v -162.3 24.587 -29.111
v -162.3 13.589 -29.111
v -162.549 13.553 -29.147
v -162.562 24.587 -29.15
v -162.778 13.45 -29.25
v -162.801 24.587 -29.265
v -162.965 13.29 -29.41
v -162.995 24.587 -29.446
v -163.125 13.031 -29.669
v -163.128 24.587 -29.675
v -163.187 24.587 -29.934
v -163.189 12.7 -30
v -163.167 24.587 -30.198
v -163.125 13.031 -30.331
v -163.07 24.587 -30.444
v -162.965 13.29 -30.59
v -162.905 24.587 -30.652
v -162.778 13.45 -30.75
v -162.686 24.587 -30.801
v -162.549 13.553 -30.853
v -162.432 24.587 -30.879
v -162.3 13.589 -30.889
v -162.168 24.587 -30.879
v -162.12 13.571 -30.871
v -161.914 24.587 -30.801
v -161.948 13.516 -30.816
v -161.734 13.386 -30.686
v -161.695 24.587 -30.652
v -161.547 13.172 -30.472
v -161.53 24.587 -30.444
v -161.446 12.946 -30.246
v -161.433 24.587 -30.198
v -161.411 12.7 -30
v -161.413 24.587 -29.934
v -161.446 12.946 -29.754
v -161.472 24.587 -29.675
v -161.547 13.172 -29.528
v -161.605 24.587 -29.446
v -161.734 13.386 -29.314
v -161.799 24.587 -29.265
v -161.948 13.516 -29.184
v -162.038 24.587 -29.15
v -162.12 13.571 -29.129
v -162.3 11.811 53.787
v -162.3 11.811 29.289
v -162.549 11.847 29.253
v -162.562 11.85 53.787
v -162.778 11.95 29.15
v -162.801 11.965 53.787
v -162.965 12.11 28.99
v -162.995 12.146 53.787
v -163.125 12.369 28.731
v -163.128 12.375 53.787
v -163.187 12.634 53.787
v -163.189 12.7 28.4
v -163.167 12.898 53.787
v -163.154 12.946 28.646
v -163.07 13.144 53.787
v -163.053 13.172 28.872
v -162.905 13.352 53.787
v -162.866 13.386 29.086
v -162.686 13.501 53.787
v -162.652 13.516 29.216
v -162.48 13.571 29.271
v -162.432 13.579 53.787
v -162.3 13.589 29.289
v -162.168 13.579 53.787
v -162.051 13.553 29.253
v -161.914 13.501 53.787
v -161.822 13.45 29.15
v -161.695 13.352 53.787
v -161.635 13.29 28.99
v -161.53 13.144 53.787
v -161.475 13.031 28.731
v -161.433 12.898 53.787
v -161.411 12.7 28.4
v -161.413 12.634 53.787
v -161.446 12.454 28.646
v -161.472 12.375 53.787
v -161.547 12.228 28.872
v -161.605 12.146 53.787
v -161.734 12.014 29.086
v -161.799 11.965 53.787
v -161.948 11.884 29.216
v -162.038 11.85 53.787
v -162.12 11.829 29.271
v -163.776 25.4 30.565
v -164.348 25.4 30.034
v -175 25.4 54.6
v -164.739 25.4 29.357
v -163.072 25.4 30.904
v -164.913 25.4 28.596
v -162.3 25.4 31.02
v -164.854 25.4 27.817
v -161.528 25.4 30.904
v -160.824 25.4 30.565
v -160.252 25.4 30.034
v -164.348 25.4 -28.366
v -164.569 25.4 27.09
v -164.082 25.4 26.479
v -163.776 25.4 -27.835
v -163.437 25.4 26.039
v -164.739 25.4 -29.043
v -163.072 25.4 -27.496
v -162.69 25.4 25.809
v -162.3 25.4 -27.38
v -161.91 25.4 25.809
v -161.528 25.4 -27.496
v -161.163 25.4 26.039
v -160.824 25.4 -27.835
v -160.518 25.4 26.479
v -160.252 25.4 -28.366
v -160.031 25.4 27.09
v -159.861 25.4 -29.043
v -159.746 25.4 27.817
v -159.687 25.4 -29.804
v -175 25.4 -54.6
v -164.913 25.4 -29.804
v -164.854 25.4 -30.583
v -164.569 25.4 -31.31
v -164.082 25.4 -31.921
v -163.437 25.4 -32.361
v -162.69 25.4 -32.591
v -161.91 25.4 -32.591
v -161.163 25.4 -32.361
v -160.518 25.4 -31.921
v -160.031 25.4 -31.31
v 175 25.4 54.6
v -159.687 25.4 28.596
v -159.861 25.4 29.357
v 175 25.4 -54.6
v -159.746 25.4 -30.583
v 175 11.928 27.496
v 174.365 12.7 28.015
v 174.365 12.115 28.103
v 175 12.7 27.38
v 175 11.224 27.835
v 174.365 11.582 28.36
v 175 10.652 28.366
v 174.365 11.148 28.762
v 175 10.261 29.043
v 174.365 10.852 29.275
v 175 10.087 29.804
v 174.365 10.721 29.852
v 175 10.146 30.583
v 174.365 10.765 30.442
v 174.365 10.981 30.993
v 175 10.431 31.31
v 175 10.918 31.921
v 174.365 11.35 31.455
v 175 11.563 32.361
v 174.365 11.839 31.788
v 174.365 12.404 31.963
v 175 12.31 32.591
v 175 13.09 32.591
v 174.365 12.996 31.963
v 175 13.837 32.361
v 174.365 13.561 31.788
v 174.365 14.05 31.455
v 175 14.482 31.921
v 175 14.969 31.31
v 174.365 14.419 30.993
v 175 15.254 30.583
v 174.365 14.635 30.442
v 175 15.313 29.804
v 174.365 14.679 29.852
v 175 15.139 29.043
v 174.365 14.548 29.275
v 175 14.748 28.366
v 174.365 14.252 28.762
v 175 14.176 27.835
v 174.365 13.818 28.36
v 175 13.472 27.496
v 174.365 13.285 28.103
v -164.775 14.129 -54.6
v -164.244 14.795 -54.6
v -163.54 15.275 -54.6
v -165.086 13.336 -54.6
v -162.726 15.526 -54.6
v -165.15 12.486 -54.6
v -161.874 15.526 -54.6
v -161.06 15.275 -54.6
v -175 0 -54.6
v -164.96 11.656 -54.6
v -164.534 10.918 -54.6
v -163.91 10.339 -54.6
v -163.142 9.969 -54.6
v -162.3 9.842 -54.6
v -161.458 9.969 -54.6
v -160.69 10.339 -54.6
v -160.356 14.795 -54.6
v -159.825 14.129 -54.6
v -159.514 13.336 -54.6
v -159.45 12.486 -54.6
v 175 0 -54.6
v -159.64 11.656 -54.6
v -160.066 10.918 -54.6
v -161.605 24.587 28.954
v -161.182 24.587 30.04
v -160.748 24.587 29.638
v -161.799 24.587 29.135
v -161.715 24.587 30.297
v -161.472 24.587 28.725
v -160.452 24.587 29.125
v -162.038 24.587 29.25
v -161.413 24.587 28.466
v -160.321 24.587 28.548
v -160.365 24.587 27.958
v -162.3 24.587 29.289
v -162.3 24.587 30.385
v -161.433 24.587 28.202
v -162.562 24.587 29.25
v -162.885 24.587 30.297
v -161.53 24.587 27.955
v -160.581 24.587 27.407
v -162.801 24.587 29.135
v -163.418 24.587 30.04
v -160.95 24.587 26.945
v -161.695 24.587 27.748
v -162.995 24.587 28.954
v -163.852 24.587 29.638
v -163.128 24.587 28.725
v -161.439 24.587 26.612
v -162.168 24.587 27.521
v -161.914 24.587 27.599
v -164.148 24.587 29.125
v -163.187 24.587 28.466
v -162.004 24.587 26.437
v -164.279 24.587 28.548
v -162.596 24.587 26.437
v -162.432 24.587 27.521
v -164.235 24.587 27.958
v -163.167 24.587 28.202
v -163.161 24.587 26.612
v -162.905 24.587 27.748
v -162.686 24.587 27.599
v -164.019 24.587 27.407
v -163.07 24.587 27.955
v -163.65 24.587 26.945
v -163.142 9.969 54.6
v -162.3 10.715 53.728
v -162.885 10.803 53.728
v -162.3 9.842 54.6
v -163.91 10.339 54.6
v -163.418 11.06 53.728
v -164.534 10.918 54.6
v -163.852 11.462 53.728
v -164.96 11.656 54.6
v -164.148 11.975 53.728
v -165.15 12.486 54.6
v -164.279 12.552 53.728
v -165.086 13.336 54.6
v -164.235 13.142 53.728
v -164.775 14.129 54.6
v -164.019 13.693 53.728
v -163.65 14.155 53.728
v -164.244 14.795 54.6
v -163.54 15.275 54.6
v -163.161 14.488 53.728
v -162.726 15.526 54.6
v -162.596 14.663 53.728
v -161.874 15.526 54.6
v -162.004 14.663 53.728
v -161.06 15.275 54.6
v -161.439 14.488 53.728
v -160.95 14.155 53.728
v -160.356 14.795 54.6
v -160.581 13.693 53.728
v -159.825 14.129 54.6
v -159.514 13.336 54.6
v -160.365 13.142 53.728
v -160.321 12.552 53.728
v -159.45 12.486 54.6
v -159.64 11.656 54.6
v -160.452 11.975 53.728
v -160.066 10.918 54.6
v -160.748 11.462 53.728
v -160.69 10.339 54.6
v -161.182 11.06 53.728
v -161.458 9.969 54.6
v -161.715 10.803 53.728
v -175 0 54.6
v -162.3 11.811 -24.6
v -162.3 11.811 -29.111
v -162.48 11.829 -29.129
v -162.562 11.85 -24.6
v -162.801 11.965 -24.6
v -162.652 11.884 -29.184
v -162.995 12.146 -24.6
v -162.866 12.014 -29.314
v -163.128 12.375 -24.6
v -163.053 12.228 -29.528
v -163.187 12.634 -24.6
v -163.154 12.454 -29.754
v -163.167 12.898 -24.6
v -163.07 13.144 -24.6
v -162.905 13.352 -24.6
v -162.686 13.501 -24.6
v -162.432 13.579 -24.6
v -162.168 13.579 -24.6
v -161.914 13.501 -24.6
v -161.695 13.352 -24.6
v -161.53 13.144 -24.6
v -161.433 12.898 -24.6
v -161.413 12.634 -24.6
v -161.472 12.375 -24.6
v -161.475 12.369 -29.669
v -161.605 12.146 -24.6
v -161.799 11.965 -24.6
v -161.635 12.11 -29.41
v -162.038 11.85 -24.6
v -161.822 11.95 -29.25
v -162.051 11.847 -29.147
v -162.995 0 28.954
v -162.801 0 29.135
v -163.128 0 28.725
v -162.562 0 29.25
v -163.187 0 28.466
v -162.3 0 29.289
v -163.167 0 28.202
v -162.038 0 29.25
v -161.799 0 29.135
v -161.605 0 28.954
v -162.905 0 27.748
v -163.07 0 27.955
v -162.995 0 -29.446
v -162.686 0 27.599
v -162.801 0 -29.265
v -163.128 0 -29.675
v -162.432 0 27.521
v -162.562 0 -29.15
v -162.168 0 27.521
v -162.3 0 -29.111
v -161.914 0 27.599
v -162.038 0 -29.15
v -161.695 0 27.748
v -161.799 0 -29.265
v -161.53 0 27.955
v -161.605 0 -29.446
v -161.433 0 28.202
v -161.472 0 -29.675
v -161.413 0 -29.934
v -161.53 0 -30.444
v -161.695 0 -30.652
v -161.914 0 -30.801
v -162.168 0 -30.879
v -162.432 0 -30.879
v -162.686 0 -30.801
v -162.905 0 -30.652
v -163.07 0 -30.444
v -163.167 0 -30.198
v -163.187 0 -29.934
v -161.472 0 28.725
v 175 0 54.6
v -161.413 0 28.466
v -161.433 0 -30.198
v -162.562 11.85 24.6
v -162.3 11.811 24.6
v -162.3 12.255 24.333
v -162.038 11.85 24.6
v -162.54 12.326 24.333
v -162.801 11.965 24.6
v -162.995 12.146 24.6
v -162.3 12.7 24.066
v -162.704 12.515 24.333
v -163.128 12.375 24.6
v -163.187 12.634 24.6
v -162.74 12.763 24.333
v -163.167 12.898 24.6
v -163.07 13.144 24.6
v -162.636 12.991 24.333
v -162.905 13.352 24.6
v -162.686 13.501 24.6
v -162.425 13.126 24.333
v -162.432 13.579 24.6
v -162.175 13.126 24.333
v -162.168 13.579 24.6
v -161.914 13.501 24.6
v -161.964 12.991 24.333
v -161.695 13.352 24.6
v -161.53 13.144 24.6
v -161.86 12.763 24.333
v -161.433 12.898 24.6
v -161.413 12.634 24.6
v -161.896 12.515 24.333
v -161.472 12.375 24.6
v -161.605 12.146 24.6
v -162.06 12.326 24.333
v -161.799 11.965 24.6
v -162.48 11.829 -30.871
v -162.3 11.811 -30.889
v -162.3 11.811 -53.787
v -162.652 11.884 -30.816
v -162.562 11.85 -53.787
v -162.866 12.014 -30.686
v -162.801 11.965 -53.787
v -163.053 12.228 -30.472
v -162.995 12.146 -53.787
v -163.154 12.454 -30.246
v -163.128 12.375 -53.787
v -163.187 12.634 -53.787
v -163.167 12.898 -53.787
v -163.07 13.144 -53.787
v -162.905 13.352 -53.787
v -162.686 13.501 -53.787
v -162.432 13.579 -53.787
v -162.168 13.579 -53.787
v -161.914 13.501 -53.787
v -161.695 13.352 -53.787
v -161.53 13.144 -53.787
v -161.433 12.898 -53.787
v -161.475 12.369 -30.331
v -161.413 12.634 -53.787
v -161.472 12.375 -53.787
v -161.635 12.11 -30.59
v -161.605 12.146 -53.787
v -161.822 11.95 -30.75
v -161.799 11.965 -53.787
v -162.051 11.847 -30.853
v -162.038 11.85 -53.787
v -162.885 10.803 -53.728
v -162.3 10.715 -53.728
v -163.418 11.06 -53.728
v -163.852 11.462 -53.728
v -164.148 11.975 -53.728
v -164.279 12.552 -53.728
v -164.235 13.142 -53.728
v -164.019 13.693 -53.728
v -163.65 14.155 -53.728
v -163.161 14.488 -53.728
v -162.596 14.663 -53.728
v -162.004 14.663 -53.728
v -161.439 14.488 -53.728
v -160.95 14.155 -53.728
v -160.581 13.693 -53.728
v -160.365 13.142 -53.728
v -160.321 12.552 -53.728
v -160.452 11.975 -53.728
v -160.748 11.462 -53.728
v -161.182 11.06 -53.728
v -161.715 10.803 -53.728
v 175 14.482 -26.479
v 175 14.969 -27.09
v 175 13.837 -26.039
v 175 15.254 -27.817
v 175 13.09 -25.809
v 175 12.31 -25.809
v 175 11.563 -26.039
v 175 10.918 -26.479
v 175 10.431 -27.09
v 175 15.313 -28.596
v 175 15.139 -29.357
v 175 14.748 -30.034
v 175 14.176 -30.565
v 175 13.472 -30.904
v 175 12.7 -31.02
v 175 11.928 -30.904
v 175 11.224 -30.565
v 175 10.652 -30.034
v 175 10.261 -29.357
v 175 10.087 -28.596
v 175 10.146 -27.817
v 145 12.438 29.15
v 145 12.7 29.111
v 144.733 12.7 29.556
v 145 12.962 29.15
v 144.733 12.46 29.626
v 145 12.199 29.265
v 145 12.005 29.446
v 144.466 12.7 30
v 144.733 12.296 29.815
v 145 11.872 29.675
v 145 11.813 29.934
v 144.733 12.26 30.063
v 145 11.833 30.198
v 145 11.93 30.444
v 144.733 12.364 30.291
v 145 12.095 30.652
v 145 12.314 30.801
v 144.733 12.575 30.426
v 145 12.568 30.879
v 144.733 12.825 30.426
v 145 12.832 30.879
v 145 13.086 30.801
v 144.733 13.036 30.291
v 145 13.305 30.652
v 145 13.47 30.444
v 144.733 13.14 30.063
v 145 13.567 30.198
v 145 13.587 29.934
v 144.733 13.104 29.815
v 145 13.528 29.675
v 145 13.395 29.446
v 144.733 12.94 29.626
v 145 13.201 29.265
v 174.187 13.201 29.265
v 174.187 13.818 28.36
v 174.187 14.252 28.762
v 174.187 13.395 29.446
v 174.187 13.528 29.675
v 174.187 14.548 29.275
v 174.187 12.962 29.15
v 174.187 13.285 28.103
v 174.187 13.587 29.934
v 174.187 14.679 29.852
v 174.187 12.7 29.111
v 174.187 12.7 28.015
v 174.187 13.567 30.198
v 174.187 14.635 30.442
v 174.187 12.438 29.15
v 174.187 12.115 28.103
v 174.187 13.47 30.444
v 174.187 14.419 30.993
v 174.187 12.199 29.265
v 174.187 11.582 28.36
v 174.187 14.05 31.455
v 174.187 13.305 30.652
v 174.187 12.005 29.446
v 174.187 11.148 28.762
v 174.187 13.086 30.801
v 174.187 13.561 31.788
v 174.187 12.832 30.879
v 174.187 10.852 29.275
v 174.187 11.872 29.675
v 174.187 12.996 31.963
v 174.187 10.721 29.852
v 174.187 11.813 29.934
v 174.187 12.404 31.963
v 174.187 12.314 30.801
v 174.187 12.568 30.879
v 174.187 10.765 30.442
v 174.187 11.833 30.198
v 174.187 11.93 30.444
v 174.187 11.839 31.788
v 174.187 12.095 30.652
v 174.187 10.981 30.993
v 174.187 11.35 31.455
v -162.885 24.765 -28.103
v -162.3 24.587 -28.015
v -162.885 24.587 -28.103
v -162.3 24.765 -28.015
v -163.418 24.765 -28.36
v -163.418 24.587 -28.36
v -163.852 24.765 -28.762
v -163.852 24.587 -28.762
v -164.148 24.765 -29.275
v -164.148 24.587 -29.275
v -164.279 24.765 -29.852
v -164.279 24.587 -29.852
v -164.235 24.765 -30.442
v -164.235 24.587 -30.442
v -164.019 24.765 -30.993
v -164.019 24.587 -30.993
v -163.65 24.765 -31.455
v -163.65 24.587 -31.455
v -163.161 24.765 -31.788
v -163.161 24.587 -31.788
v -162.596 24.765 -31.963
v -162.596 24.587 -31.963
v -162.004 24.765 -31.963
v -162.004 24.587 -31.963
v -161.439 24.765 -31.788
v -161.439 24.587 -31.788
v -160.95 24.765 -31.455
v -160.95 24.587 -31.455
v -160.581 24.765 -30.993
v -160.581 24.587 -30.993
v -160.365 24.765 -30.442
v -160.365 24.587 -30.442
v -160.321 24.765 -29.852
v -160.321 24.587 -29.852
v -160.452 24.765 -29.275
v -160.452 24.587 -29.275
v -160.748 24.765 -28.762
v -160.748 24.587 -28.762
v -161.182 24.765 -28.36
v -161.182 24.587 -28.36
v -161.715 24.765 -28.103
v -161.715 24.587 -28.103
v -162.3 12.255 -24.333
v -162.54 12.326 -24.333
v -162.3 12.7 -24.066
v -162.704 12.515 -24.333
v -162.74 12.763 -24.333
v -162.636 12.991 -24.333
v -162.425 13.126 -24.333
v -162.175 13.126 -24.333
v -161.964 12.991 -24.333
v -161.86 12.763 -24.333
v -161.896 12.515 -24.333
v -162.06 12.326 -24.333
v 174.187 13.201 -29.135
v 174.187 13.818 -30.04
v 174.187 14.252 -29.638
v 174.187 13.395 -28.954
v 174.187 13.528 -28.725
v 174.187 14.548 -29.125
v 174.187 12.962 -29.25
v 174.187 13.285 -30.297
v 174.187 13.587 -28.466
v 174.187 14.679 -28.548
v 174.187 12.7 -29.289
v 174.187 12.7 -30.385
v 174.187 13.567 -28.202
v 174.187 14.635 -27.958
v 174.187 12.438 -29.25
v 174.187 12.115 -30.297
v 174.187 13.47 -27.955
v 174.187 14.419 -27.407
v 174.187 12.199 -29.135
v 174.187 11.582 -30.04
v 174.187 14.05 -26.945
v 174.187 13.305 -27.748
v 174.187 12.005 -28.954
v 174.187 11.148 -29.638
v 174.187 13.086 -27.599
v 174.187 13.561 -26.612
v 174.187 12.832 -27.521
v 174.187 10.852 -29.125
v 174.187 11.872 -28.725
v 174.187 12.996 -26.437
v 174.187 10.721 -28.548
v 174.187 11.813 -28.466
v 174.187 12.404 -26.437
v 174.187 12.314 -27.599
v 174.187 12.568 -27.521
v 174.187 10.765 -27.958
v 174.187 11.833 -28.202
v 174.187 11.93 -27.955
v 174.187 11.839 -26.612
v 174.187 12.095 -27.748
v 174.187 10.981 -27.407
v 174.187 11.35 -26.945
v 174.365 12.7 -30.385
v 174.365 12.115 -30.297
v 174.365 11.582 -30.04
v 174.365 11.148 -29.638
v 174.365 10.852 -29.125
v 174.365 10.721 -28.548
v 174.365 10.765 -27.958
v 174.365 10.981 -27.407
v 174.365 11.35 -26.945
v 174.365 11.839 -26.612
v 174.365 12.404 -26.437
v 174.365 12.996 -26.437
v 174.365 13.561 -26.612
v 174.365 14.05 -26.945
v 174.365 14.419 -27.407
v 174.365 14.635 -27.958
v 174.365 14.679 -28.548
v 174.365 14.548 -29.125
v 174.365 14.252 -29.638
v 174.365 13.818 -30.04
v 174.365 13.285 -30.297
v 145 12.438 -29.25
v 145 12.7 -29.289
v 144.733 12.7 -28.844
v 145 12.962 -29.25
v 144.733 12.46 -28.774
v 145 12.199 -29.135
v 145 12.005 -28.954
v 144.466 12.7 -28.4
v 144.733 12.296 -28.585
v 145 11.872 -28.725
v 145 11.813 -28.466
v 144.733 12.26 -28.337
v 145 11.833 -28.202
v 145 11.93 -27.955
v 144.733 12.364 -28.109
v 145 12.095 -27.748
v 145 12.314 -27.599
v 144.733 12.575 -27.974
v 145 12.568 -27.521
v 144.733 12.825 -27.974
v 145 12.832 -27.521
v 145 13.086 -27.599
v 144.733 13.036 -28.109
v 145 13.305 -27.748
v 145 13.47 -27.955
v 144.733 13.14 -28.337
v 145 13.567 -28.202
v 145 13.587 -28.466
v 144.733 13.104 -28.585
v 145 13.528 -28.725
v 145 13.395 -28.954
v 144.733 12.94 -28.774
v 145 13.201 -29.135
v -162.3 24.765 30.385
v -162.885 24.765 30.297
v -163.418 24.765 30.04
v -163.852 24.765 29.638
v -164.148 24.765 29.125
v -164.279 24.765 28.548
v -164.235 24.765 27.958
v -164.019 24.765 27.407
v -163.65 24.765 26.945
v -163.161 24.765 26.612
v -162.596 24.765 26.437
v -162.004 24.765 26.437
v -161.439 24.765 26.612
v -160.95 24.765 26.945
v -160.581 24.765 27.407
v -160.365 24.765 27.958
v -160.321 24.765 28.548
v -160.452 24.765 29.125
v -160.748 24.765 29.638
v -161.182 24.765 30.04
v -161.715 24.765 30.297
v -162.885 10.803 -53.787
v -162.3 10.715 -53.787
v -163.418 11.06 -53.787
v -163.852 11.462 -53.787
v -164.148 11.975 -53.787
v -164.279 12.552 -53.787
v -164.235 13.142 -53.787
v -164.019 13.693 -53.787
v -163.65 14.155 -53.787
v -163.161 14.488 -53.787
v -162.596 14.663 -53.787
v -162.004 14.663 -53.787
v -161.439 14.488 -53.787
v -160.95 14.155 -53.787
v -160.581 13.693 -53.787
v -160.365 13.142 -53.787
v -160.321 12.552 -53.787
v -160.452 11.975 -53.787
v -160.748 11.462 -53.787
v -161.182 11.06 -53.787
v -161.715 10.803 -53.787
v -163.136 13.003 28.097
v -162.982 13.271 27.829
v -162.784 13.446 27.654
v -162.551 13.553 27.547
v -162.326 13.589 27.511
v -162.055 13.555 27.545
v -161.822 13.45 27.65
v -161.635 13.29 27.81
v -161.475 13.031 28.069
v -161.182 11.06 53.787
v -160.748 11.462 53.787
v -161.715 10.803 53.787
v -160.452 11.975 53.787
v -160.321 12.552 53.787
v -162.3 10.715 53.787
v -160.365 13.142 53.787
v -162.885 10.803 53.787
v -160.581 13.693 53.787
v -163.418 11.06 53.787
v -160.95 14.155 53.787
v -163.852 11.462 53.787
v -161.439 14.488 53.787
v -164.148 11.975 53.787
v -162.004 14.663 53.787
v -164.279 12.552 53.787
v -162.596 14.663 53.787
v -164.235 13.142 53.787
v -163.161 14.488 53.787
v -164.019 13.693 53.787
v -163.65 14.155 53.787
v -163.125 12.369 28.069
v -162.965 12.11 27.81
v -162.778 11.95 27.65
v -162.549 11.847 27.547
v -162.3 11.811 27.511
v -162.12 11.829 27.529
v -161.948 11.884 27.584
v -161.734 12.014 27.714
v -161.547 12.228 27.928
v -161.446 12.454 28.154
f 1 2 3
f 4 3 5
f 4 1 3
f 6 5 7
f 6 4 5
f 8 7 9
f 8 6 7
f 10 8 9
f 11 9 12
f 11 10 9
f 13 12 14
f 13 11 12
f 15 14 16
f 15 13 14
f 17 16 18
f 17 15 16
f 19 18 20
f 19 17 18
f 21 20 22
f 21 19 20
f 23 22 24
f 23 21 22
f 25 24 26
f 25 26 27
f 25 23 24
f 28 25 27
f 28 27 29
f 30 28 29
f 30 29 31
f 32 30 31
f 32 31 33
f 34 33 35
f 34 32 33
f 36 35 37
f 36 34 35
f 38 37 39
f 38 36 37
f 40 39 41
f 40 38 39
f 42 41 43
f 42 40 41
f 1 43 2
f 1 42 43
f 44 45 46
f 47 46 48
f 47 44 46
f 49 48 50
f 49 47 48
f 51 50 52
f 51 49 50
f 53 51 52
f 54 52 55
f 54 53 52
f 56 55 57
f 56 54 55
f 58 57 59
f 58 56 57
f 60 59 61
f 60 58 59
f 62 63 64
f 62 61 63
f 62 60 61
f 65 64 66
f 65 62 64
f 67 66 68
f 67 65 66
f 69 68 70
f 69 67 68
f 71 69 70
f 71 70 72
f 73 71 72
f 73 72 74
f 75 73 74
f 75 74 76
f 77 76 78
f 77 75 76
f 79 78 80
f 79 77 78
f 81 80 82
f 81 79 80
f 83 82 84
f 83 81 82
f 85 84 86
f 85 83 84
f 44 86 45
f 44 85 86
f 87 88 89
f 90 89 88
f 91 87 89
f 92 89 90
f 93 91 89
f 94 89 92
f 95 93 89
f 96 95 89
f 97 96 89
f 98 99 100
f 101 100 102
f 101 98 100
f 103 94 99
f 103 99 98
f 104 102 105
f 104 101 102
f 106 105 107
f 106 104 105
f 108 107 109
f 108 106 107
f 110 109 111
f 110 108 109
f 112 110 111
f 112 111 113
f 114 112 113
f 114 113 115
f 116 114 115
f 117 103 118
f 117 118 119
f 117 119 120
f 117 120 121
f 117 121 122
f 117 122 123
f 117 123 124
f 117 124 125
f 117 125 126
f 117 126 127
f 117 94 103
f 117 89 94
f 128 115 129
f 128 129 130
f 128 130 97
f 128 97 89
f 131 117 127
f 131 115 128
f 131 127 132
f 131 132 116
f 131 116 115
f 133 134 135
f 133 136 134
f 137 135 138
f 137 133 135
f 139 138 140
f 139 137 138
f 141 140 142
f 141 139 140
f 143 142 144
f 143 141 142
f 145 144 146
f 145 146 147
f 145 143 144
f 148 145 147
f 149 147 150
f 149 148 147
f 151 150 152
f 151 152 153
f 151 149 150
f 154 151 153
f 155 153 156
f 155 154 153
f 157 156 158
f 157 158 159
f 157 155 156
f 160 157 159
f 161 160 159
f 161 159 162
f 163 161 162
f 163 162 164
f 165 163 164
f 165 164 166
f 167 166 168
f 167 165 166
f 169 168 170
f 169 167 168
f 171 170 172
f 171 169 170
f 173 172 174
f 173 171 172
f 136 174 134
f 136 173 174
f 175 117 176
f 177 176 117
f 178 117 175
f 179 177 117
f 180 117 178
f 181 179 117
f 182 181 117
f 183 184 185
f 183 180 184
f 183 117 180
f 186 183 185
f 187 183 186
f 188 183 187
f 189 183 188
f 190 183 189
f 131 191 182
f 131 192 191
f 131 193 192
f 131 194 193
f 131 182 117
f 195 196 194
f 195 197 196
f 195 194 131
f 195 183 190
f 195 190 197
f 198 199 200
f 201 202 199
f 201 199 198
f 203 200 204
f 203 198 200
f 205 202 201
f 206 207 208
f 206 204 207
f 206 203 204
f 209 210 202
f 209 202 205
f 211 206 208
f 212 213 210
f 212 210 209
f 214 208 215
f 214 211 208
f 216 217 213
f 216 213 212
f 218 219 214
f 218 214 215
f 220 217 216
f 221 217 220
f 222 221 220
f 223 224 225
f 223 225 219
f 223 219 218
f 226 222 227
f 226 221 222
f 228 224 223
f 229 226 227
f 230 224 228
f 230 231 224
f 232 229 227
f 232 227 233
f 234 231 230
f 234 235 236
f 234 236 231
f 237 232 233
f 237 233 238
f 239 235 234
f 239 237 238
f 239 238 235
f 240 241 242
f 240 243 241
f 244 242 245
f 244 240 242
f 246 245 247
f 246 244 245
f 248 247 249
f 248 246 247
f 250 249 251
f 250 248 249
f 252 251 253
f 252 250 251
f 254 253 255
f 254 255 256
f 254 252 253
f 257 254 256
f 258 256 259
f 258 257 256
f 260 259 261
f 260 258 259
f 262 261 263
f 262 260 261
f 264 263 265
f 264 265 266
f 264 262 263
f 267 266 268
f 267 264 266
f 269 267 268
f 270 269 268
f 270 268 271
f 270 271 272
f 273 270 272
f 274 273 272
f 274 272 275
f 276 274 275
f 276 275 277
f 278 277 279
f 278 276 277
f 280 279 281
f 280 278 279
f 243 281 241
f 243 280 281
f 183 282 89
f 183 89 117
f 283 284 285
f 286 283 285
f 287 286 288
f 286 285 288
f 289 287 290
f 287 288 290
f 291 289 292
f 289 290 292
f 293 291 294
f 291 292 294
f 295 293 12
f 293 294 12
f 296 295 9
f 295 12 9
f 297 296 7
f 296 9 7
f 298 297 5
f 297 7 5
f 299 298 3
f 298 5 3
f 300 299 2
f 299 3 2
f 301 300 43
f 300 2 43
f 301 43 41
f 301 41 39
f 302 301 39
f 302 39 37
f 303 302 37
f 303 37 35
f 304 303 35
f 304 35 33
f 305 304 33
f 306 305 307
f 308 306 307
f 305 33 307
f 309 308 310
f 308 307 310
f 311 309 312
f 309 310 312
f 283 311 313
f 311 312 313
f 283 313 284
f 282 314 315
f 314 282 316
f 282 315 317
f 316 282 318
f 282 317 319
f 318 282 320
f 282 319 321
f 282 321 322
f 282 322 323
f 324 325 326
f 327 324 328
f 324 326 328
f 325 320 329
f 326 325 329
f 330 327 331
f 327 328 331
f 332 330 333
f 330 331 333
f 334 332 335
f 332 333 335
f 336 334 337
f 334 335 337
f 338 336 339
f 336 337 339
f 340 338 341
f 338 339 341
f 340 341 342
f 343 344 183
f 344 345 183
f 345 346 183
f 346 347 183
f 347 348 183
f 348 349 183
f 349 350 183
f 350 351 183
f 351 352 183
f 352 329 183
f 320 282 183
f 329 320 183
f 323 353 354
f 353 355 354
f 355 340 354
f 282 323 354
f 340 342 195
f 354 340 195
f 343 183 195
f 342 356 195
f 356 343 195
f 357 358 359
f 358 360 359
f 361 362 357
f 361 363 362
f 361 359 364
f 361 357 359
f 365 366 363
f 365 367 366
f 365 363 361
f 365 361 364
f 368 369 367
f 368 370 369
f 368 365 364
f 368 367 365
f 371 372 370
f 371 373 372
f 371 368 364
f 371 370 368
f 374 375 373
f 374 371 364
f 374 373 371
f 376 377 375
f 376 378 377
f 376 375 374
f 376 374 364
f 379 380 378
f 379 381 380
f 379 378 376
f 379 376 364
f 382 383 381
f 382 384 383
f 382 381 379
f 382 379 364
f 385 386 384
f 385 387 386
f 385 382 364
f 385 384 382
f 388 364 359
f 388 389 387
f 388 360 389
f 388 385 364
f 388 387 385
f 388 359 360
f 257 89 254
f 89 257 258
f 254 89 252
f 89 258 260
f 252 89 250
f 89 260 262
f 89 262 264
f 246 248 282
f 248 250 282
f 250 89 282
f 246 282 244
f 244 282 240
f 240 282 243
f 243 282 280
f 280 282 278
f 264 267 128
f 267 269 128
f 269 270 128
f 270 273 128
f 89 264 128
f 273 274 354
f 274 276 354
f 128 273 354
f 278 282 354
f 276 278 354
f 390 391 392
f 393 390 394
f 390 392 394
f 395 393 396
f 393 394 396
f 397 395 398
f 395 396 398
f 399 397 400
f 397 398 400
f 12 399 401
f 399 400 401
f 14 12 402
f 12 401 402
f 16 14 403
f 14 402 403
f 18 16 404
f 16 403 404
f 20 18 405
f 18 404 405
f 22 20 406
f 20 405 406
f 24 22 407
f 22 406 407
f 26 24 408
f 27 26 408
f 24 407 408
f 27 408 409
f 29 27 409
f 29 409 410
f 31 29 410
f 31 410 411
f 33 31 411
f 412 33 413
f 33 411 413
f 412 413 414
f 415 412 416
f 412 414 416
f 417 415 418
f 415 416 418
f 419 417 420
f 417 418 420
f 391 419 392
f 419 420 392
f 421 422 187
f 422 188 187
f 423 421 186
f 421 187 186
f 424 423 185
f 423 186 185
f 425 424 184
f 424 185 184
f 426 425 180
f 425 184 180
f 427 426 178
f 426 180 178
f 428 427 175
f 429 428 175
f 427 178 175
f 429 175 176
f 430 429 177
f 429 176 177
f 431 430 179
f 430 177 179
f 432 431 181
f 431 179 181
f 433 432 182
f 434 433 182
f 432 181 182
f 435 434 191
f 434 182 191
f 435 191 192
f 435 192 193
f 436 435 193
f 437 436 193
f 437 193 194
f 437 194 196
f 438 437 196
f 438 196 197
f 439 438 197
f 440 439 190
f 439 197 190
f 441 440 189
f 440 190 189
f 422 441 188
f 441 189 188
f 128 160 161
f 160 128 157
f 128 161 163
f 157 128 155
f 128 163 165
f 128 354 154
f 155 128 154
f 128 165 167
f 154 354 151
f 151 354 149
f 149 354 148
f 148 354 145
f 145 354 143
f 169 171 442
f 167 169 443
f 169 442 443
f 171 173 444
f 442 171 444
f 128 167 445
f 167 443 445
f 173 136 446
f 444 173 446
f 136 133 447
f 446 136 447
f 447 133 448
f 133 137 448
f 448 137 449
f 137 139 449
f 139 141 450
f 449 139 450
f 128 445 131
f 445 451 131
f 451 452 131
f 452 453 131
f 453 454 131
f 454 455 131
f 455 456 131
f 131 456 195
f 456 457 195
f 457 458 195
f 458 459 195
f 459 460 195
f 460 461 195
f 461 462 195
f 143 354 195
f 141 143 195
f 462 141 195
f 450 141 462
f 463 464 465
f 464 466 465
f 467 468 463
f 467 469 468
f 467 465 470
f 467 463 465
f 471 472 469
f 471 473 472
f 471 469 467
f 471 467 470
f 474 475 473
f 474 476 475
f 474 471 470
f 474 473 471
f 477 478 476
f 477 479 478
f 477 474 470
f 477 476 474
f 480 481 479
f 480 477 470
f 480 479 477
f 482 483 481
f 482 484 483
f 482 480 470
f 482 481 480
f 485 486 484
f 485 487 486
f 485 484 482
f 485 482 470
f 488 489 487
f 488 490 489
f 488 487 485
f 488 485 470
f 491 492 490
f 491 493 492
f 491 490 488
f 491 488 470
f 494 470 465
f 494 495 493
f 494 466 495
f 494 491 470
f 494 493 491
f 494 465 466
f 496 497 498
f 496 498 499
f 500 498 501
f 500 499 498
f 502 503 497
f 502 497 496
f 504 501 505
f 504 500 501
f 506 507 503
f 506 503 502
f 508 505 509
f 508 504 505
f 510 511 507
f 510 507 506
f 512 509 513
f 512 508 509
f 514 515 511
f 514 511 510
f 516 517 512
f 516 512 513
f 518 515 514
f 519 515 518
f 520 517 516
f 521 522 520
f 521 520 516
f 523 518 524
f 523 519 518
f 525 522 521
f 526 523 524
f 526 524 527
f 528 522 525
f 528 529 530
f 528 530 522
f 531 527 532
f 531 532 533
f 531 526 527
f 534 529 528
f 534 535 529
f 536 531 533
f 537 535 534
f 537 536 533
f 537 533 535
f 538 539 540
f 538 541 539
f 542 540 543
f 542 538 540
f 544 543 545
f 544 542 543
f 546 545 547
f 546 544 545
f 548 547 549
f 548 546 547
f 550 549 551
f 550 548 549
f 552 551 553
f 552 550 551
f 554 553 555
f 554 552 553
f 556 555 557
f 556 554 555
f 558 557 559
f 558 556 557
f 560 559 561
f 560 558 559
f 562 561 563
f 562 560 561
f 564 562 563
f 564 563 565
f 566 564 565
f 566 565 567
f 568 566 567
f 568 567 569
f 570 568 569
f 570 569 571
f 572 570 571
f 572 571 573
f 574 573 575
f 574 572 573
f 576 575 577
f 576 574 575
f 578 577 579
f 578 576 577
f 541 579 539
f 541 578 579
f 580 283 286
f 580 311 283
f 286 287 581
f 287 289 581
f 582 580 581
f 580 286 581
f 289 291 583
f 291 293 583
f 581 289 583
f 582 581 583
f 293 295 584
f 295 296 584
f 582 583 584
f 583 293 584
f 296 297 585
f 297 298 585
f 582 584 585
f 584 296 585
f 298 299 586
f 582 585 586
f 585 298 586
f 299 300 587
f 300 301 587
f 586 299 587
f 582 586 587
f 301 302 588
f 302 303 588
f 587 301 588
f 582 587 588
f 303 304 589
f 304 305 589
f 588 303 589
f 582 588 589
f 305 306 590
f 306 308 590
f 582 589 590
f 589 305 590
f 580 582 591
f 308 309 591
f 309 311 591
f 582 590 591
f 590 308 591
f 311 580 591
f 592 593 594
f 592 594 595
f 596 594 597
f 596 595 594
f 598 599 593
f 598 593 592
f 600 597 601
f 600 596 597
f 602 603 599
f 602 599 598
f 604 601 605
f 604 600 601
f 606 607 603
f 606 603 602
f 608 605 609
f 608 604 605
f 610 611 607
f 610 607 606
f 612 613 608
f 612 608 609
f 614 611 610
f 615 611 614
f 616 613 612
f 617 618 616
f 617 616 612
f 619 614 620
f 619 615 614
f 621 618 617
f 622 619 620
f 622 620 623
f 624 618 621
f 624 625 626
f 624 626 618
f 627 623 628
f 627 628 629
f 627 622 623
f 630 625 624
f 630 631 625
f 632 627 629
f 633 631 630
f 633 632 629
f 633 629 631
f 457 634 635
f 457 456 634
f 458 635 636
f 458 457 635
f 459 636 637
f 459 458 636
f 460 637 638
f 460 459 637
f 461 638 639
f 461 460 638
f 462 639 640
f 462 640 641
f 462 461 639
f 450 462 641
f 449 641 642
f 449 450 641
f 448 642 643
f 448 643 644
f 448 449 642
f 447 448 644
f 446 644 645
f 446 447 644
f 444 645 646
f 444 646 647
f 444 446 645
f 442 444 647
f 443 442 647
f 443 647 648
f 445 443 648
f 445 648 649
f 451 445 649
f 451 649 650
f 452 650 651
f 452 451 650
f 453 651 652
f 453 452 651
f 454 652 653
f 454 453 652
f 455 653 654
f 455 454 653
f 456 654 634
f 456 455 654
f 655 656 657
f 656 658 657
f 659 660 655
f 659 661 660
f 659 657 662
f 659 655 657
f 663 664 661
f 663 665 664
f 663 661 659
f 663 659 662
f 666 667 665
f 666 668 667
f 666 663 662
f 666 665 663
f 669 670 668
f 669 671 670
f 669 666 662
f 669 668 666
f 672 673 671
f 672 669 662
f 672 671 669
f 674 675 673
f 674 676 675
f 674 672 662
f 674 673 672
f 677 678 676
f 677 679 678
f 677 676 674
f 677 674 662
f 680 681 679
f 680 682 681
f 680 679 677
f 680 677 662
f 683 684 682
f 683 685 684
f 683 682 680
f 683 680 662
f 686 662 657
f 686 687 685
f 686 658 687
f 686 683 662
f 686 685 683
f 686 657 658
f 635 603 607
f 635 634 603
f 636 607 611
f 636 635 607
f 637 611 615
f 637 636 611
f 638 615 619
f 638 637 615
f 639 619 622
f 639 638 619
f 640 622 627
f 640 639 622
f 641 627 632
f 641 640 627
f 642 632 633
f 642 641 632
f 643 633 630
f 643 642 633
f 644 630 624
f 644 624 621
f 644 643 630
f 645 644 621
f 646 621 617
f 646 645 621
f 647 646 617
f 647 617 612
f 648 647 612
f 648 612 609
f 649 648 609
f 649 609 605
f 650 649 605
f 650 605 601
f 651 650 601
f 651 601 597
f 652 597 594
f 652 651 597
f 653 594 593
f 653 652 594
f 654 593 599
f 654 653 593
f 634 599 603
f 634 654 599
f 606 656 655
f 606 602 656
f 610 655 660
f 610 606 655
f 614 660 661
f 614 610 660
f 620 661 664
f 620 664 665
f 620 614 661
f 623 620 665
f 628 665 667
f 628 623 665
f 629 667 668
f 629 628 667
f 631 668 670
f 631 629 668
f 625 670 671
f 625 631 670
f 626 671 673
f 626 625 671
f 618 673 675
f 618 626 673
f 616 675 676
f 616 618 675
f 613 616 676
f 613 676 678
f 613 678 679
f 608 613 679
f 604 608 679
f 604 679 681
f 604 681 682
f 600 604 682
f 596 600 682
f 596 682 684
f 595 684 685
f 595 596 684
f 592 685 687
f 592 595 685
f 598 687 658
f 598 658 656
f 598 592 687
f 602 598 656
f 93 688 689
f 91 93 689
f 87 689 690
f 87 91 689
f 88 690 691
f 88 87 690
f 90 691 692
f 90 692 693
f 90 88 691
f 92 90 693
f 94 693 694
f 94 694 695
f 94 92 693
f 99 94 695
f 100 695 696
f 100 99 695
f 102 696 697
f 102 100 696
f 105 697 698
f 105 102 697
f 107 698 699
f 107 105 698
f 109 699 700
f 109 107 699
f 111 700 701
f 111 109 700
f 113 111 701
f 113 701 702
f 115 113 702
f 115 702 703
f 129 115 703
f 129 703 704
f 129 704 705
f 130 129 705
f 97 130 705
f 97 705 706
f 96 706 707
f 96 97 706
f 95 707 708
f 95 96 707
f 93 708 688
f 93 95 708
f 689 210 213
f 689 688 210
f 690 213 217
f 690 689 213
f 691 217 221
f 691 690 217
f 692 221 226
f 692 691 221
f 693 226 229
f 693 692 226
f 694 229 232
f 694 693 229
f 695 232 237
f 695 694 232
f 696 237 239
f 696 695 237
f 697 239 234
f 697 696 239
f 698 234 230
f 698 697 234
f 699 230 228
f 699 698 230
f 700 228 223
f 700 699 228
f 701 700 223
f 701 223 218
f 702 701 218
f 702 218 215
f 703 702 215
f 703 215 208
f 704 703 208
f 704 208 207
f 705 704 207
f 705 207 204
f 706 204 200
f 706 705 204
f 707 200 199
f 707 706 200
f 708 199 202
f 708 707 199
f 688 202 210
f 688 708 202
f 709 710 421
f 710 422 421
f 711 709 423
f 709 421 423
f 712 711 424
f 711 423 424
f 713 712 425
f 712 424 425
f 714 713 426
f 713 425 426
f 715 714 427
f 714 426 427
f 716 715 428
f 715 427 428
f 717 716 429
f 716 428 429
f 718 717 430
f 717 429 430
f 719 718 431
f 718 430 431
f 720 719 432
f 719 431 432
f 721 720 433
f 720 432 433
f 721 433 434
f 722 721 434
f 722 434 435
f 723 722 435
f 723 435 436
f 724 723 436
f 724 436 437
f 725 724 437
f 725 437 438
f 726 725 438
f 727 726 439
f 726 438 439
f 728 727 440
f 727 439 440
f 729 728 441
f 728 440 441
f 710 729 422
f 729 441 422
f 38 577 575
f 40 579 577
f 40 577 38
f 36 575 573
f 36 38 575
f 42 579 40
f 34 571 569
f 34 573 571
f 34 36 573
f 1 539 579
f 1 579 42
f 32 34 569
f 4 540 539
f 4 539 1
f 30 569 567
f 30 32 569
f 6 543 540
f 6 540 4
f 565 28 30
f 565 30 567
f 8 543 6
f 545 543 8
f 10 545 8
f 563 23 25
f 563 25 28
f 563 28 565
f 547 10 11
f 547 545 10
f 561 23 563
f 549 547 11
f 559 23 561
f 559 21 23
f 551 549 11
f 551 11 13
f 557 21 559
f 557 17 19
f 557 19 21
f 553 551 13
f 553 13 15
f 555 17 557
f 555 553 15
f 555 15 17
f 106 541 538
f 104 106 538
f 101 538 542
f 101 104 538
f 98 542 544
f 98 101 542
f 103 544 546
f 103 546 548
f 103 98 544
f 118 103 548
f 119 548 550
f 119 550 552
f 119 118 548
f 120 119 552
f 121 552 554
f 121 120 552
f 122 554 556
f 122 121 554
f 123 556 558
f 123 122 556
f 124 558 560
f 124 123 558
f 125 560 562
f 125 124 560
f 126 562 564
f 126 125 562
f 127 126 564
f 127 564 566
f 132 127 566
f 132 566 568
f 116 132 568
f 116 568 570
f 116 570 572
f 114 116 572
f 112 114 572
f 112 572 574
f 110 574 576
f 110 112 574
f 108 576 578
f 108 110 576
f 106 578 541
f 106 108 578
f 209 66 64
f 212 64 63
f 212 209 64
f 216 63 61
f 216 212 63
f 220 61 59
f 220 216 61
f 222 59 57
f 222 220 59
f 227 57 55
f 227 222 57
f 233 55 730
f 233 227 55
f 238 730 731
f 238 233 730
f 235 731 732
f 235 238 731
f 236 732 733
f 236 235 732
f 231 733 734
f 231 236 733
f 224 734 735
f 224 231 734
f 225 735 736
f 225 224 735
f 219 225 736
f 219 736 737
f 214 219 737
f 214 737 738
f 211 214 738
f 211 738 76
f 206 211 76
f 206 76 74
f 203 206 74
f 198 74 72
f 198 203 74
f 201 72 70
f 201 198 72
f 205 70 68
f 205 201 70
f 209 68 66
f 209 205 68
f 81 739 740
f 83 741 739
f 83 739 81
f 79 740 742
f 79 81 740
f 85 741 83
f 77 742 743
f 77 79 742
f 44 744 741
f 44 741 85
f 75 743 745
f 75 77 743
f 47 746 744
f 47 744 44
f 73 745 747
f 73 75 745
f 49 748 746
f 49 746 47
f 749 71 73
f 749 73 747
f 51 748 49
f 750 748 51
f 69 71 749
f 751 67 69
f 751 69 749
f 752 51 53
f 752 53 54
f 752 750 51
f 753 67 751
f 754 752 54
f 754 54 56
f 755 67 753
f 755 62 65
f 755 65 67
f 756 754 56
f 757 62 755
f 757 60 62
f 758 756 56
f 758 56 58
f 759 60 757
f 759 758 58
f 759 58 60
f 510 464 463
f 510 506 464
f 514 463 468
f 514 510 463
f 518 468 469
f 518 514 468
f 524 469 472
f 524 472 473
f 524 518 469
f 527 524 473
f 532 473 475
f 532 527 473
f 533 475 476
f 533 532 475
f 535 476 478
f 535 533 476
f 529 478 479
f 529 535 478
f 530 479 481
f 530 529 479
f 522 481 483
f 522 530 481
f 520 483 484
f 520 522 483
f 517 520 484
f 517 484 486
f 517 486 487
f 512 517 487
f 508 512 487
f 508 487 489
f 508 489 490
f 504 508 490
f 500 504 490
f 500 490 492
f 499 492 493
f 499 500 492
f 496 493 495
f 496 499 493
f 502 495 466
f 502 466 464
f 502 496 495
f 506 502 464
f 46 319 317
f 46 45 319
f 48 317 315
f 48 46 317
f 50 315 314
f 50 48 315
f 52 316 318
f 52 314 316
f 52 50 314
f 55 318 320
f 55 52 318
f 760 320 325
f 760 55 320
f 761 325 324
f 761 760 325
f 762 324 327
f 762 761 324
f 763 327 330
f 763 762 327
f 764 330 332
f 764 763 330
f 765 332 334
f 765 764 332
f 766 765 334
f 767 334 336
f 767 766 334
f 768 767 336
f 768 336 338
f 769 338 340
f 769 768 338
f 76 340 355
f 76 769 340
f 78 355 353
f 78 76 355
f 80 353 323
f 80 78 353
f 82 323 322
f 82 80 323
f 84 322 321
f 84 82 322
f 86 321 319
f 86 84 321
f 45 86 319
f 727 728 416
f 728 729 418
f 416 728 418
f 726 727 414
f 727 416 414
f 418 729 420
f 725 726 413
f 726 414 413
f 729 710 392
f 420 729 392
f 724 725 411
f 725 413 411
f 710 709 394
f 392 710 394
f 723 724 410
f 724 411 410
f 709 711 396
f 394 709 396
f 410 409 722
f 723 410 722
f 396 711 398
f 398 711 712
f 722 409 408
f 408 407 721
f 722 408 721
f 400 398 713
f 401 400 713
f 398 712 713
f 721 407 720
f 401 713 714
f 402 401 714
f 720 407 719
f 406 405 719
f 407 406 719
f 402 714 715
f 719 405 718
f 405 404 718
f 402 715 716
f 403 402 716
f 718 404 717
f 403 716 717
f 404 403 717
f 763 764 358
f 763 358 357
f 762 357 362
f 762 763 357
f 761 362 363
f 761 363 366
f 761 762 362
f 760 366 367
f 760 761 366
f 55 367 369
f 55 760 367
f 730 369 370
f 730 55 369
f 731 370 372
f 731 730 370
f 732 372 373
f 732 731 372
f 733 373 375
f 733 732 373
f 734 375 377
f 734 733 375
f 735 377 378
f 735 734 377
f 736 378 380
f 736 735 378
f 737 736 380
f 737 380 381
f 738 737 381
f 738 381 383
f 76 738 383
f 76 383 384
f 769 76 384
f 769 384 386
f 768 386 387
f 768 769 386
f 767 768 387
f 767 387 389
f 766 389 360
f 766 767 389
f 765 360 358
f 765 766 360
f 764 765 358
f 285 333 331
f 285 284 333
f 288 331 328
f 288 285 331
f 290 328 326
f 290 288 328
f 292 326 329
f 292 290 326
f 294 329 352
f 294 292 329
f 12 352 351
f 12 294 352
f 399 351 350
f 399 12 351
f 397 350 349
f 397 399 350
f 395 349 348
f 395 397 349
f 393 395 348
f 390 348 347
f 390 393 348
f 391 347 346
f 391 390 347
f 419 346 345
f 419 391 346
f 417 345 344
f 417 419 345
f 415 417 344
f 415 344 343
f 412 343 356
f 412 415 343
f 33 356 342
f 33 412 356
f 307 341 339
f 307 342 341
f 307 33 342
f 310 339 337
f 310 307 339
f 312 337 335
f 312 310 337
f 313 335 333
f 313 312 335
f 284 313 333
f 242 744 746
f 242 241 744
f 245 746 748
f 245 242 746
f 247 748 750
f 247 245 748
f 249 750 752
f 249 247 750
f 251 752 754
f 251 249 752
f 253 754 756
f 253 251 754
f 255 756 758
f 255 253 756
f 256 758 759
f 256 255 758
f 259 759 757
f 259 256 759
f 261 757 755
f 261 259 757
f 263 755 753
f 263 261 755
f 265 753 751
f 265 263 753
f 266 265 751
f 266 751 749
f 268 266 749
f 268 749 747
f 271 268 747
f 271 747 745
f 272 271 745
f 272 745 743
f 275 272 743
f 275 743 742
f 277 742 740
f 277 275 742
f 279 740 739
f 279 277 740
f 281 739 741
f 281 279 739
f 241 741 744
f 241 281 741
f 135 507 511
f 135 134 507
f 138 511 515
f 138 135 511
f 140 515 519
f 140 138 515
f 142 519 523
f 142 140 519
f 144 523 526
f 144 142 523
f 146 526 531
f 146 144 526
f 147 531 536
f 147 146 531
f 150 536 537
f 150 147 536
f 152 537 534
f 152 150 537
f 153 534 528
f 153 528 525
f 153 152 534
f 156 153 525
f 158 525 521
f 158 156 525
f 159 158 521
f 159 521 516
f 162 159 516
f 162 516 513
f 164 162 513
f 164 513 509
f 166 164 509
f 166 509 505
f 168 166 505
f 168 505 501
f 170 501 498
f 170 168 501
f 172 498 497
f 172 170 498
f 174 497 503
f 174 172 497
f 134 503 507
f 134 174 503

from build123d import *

# Parameters (mm, degrees)
SKETCH1_W                                   = 350
SKETCH1_H                                   = 109.2
BOSS_EXTRUDE1_DEPTH                         = 25.4
CBORE_FOR_0_BINDING_HEAD_MACHINE_SC_2_COUNT = 2
CBORE_FOR_0_BINDING_HEAD_MACHINE_SC_2_PITCH = 58.4
CBORE_FOR_0_BINDING_HEAD_MACHINE_SC_3_COUNT = 2
CBORE_FOR_0_BINDING_HEAD_MACHINE_SC_3_PITCH = 58.4


with BuildPart() as part:
    # Sketch1 → Boss-Extrude1 (new body)
    with BuildSketch(Plane(origin=(0, 0, 0), x_dir=(1, 0, 0), z_dir=(0, 1, 0))):
        Rectangle(SKETCH1_W, SKETCH1_H)
    extrude(amount=BOSS_EXTRUDE1_DEPTH)

    # Sketch3 → CBORE for #0 Binding Head Machine Screw1 (revolve, cut)
    with BuildSketch(Plane(origin=(-162.3, 12.7, 54.6), x_dir=(0, -1, 0), z_dir=(1, 0, 0))):
        Polygon((0, 0), (0, 30.53416509), (0.889, 30), (0.889, 0.8128), (1.98501, 0.8128), (1.98501, 0.87249), (2.8575, 0), align=None)
    cbore_for_0_binding_head_machine_screw1 = revolve(axis=Axis((-162.3, 12.7, 60.95), (0, 0, -1)), mode=Mode.SUBTRACT)

    # Mirror1: CBORE for #0 Binding Head Machine Screw1 across plane
    add(cbore_for_0_binding_head_machine_screw1.mirror(Plane.XY), mode=Mode.SUBTRACT)

    # Sketch5 → CBORE for #0 Binding Head Machine Screw2 (revolve, cut)
    with BuildSketch(Plane(origin=(175, 12.7, 30), x_dir=(0, 0, -1), z_dir=(0, 1, 0))):
        Polygon((0, 0), (0, 30.53416509), (0.889, 30), (0.889, 0.8128), (1.98501, 0.8128), (1.98501, 0.635), (2.62001, 0), align=None)
    cbore_for_0_binding_head_machine_screw2 = revolve(axis=Axis((181.35, 12.7, 30), (-1, 0, 0)), mode=Mode.SUBTRACT)

    # CBORE for _0 Binding Head Machine Sc 2: CBORE for #0 Binding Head Machine Screw2 ×2
    with Locations(*[(0, 0, -i * CBORE_FOR_0_BINDING_HEAD_MACHINE_SC_2_PITCH) for i in range(1, CBORE_FOR_0_BINDING_HEAD_MACHINE_SC_2_COUNT)]):
        add(cbore_for_0_binding_head_machine_screw2, mode=Mode.SUBTRACT)

    # Sketch7 → CBORE for #0 Binding Head Machine Screw3 (revolve, cut)
    with BuildSketch(Plane(origin=(-162.3, 25.4, -30), x_dir=(0, 0, 1), z_dir=(1, 0, 0))):
        Polygon((0, 0), (0, 30.53416509), (0.889, 30), (0.889, 0.8128), (1.98501, 0.8128), (1.98501, 0.635), (2.62001, 0), align=None)
    cbore_for_0_binding_head_machine_screw3 = revolve(axis=Axis((-162.3, 31.75, -30), (0, -1, 0)), mode=Mode.SUBTRACT)

    # CBORE for _0 Binding Head Machine Sc 3: CBORE for #0 Binding Head Machine Screw3 ×2
    with Locations(*[(0, 0, i * CBORE_FOR_0_BINDING_HEAD_MACHINE_SC_3_PITCH) for i in range(1, CBORE_FOR_0_BINDING_HEAD_MACHINE_SC_3_COUNT)]):
        add(cbore_for_0_binding_head_machine_screw3, mode=Mode.SUBTRACT)


solid = part.part
